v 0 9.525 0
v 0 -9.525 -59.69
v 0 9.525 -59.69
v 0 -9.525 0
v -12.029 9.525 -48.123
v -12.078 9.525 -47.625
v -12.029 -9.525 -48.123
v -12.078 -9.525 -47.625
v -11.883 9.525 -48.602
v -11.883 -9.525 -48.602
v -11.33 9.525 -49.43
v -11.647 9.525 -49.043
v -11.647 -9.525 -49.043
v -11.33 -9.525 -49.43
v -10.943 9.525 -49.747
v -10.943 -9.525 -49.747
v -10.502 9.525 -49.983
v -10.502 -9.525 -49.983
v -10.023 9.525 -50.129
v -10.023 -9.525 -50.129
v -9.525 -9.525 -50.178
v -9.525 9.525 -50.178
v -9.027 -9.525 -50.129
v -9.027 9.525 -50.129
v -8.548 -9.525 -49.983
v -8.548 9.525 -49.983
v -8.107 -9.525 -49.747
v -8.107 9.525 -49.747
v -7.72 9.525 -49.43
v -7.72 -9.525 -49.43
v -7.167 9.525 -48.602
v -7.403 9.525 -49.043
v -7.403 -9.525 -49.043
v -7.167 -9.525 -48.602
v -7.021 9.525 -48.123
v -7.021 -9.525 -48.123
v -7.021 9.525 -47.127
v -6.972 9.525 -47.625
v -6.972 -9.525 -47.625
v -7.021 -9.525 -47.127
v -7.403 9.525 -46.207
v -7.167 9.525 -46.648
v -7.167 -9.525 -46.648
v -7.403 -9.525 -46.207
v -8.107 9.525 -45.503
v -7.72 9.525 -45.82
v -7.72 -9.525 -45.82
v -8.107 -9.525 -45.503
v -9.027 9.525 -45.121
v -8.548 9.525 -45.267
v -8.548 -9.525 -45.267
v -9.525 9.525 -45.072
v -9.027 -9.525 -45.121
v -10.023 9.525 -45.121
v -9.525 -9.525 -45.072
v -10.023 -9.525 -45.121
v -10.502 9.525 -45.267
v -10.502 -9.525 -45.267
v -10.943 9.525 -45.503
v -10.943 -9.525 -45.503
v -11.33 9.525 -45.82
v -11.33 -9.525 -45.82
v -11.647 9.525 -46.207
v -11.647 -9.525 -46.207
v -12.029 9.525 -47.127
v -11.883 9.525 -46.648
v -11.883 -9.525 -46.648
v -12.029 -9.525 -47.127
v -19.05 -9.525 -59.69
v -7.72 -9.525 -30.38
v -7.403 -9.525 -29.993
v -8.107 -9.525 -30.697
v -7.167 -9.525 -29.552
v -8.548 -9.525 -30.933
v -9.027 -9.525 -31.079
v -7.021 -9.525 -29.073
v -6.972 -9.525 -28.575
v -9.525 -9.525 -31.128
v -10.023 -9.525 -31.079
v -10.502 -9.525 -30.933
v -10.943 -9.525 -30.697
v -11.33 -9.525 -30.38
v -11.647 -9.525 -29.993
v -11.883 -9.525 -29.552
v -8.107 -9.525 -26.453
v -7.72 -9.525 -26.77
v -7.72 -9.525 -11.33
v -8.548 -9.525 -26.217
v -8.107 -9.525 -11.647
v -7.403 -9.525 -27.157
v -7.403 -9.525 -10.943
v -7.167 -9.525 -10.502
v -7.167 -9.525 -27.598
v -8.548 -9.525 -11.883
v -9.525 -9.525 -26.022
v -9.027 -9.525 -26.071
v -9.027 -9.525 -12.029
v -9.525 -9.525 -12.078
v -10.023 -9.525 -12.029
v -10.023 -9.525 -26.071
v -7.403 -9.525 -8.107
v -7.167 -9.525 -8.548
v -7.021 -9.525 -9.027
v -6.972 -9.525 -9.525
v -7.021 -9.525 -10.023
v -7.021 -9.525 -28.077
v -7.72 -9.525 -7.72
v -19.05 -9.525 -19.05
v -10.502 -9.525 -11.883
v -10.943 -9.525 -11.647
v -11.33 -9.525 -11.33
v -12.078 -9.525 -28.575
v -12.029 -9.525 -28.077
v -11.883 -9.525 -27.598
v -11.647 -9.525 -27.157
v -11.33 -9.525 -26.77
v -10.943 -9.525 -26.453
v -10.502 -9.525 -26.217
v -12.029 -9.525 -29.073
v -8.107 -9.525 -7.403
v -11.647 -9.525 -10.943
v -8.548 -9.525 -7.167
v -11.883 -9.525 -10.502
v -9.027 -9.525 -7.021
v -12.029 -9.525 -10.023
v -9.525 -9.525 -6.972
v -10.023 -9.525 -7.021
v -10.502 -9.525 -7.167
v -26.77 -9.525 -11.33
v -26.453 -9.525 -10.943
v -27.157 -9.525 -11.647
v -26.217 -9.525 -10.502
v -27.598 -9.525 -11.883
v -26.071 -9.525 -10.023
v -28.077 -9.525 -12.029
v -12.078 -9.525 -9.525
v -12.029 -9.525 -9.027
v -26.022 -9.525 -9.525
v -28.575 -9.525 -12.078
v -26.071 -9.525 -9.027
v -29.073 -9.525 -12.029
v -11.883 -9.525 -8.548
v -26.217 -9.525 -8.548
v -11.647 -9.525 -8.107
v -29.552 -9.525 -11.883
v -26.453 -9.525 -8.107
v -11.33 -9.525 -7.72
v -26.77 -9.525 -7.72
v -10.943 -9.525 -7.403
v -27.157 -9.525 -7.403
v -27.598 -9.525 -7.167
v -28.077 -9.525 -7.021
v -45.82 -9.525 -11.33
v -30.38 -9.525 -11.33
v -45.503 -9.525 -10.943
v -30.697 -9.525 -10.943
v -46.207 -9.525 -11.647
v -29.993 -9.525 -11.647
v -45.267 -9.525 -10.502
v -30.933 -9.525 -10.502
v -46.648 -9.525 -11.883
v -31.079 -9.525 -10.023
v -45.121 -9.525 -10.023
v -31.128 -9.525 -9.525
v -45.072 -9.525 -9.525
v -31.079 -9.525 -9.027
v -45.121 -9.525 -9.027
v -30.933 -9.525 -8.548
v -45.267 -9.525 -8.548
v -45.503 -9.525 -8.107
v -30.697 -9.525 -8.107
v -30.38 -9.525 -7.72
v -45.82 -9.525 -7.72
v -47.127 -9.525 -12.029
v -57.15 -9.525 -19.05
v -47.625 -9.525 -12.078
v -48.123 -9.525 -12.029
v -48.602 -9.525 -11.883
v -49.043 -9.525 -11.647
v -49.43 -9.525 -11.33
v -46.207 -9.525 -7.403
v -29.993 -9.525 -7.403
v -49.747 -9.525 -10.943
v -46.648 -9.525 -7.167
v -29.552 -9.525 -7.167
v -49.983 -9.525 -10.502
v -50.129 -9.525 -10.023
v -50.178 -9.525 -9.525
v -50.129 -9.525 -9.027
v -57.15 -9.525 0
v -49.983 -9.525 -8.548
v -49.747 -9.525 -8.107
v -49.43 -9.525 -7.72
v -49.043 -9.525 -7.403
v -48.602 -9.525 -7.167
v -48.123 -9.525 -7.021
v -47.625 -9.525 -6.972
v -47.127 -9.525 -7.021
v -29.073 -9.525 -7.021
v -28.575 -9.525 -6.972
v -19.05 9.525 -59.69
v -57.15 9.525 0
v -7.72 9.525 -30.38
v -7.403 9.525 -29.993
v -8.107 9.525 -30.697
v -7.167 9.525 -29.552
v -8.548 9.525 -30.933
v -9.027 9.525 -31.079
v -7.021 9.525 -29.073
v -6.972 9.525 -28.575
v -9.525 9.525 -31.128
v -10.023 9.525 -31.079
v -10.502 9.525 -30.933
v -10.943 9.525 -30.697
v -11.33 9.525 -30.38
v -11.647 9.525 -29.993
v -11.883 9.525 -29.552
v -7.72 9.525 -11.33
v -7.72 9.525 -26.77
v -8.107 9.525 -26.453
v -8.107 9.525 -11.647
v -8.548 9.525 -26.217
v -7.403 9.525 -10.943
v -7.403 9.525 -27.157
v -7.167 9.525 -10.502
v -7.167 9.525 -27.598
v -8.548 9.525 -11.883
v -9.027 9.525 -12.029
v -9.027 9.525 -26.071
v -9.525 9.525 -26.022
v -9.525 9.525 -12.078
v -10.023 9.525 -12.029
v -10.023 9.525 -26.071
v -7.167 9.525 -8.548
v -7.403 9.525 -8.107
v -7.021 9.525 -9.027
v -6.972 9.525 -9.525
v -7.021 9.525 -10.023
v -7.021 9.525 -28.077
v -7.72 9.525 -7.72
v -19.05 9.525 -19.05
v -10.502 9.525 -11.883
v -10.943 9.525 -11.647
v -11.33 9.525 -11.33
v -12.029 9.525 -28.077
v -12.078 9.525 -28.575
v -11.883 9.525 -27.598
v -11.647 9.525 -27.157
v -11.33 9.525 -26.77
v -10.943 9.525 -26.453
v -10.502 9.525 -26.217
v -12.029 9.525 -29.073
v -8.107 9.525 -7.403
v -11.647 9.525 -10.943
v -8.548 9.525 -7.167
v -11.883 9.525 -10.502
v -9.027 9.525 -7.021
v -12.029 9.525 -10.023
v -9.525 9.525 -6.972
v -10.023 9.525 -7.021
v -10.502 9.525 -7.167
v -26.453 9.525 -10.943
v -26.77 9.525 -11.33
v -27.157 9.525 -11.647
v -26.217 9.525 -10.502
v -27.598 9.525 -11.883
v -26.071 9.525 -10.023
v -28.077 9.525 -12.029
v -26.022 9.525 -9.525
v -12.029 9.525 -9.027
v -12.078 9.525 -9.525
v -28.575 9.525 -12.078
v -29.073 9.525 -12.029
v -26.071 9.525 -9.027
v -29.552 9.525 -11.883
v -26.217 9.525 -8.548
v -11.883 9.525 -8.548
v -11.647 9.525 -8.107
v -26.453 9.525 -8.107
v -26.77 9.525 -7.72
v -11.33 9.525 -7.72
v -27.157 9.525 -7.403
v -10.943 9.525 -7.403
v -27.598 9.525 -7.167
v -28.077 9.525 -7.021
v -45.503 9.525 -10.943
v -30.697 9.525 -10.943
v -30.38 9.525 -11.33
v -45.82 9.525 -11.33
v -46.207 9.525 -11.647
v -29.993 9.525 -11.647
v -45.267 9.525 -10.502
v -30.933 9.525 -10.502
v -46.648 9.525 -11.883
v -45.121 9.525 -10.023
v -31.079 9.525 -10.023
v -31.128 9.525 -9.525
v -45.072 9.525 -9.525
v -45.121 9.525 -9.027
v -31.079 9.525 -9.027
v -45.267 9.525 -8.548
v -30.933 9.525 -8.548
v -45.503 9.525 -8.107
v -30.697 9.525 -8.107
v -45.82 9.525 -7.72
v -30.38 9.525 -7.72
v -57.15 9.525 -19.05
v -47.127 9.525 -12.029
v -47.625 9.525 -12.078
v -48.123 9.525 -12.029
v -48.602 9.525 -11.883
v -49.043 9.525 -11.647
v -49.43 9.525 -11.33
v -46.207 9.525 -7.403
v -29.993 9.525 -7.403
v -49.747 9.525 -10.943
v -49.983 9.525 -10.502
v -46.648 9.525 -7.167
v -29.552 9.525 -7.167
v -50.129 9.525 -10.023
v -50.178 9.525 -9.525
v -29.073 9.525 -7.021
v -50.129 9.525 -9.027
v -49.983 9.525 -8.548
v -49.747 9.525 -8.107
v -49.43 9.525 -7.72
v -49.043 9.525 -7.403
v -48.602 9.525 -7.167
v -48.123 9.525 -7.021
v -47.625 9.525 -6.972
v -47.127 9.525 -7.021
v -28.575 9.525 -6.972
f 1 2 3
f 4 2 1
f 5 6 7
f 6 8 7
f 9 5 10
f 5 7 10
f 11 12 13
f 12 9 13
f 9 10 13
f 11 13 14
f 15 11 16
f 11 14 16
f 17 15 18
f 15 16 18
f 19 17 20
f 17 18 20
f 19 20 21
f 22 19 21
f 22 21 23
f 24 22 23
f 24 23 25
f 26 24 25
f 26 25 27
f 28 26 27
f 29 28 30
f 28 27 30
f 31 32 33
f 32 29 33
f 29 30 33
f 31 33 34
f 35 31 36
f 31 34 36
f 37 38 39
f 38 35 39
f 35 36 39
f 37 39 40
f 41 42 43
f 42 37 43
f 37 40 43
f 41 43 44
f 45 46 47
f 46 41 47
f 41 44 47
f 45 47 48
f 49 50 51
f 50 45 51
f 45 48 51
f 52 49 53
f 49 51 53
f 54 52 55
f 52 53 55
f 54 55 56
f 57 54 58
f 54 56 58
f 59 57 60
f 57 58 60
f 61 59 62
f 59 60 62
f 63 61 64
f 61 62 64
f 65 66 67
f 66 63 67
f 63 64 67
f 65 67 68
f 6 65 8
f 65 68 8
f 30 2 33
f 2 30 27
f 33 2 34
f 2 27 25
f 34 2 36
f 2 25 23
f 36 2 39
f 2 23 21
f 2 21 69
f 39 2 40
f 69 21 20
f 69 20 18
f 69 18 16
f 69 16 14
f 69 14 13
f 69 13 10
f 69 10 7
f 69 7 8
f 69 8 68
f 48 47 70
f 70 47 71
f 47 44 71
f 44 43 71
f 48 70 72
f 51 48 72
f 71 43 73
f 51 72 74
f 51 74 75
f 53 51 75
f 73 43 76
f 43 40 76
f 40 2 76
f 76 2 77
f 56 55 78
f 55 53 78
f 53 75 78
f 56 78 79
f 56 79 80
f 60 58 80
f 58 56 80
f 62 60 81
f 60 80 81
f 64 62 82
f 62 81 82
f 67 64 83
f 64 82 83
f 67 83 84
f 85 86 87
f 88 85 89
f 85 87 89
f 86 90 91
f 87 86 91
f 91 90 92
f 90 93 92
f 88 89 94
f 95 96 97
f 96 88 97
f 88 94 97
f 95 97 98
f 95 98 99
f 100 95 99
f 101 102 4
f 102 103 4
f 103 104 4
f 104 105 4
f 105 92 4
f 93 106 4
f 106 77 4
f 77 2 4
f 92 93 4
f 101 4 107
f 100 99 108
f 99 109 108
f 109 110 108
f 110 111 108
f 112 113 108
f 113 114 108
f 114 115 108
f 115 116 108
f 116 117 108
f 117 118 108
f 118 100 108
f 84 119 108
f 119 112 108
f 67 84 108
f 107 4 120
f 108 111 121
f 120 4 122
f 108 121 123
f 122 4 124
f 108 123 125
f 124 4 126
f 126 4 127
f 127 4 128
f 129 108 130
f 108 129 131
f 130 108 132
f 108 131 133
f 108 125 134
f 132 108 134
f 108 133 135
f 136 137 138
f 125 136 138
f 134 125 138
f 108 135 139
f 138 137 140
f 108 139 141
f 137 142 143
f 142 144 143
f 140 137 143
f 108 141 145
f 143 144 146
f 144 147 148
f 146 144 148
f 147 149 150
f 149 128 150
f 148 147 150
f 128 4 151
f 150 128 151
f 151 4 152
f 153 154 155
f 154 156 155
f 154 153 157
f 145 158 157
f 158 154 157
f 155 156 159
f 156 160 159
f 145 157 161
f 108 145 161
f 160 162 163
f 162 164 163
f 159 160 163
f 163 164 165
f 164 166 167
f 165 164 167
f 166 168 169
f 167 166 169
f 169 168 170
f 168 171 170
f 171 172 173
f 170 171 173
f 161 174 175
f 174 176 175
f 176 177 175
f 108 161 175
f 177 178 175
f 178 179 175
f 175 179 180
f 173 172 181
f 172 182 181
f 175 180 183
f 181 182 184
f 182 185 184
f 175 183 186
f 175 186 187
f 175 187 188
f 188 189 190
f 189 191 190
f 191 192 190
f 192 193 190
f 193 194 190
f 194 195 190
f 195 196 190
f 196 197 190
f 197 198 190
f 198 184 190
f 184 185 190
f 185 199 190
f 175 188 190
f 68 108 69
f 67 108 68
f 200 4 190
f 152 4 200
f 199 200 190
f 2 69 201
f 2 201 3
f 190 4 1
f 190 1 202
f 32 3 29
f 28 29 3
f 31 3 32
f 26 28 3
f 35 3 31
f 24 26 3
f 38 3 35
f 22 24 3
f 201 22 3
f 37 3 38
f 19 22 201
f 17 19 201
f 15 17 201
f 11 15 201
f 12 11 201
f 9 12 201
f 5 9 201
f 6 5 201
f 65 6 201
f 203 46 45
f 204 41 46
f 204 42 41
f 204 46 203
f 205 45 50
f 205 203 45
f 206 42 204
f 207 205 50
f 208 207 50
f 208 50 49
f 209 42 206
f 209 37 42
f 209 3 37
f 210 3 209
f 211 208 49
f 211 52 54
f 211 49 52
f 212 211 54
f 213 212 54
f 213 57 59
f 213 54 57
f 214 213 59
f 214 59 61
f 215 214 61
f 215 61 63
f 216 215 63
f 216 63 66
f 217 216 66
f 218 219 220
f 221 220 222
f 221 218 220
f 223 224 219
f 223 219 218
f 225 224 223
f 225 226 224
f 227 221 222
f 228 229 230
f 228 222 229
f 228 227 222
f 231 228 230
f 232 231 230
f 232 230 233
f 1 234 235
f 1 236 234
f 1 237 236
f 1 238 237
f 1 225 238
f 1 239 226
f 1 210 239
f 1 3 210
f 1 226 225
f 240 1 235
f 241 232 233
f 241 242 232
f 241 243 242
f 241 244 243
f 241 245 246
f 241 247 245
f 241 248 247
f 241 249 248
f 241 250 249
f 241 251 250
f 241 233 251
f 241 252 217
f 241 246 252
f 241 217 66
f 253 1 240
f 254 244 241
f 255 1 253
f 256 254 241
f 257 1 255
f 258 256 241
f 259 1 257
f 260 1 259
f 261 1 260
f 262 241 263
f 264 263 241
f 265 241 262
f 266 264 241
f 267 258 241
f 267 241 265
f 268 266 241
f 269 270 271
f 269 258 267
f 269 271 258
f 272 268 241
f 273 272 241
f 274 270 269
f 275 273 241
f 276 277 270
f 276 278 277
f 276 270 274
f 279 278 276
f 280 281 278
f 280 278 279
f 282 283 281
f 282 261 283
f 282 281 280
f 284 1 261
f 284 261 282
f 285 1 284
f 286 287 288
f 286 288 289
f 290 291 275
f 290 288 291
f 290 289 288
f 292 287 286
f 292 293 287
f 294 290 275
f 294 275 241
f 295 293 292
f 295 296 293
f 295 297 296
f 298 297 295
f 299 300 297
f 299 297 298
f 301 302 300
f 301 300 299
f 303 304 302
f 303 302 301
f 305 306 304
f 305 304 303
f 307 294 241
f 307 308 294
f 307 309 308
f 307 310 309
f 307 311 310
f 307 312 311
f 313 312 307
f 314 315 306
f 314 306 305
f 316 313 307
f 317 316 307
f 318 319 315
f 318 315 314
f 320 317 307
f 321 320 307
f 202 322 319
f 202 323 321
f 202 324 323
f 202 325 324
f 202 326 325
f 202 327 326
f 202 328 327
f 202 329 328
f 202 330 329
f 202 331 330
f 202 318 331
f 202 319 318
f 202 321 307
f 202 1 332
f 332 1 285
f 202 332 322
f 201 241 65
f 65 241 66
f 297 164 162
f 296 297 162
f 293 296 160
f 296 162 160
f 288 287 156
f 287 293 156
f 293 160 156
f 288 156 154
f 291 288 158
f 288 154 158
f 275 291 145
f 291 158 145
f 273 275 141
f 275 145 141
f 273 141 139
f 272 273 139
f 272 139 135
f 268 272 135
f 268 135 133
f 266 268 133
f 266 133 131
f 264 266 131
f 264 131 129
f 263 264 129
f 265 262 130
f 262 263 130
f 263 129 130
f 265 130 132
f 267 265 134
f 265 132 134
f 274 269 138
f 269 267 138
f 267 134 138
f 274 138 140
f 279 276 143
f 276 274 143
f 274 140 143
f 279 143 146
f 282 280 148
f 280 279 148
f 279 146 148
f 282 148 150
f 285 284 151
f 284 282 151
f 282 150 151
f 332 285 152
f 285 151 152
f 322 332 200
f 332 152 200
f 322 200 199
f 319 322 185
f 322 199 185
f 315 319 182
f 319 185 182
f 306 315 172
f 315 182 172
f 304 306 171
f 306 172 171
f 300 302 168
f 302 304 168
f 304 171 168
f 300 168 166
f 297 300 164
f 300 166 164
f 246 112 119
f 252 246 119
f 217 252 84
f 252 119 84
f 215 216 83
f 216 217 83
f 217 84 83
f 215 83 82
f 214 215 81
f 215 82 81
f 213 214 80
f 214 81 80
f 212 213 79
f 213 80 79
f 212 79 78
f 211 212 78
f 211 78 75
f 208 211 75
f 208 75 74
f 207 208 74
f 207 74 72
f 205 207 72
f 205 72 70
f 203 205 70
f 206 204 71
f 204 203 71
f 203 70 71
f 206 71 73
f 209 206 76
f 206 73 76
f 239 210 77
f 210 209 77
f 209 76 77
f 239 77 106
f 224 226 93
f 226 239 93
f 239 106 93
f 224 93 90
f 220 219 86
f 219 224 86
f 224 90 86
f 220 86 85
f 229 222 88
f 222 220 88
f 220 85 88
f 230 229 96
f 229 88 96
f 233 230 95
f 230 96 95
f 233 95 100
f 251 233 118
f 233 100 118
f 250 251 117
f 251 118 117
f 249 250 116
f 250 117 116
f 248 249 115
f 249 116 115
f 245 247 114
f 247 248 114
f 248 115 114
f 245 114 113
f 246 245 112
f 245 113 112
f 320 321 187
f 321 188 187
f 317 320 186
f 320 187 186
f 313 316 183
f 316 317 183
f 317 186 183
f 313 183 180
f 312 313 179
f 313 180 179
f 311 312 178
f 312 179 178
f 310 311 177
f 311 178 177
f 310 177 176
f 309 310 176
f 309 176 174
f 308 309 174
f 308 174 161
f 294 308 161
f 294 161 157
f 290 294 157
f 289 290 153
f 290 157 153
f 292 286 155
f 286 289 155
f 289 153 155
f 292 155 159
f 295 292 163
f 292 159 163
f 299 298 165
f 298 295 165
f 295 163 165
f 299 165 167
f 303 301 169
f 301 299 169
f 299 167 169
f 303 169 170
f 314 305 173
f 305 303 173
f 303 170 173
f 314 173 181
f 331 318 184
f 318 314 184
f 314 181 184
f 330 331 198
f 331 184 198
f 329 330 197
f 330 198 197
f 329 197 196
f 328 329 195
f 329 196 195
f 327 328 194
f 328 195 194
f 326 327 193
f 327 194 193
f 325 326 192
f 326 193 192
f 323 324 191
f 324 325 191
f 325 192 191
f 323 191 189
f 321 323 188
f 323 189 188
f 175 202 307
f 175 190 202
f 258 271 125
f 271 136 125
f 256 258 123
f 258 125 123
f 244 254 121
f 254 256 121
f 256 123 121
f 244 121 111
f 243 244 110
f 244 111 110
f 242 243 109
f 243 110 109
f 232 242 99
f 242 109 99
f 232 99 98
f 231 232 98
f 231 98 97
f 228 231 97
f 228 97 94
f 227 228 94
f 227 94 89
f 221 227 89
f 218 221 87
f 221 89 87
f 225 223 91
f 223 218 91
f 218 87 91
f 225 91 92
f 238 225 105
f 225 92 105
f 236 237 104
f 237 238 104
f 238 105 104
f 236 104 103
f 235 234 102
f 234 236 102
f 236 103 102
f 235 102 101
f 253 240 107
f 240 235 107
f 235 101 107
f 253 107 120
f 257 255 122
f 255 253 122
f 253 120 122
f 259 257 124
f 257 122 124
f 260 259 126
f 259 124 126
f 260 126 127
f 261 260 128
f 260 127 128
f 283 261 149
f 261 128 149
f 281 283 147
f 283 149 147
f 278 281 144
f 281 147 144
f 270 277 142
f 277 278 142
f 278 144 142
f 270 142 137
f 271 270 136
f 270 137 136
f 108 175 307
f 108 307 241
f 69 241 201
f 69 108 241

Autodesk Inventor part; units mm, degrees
ref_plane "YZ Plane" through (0, 0, 0) normal (1, 0, 0) x (0, 1, 0)
ref_plane "XZ Plane" through (0, 0, 0) normal (0, 1, 0) x (-1, 0, 0)
ref_plane "XY Plane" through (0, 0, 0) normal (0, 0, 1) x (1, 0, 0)
sketch "Sketch1" plane through (0, 0, 0) normal (0, 1, 0) x (-1, 0, 0)
  line L0 (0, 0) -> (57.15, 0)
  line L1 (57.15, 0) -> (57.15, -19.05)
  line L2 (57.15, -19.05) -> (19.05, -19.05)
  line L3 (19.05, -19.05) -> (19.05, -59.69)
  line L4 (19.05, -59.69) -> (0, -59.69)
  line L5 (0, -59.69) -> (0, 0)
  circle A0 centre (28.575, -9.525) radius 2.5527
  circle A1 centre (47.625, -9.525) radius 2.5527
  line L6 (19.05, -19.05) -> (0, 0) construction
  circle A2 centre (9.525, -28.575) radius 2.5527
  circle A3 centre (9.525, -47.625) radius 2.5527
  circle A4 centre (9.525, -9.525) radius 2.5527
  point P0 (57.15, -9.525)
  dimension "d0" = 19.05
  dimension "d1" = 19.05
  dimension "d2" = 59.69
  dimension "d3" = 57.15
  dimension "d4" = 5.1054
  dimension "d5" = 28.575
  dimension "d6" = 19.05
extrude "Extrusion1" add sketch "Sketch1" along normal mid plane 19.05
thread "Thread1" size "1/4-20 UNC" class "2B" standard "ANSI Unified Screw Threads" full length
thread "Thread2" size "1/4-20 UNC" class "2B" standard "ANSI Unified Screw Threads" full length
thread "Thread3" size "1/4-20 UNC" class "2B" standard "ANSI Unified Screw Threads" full length
thread "Thread4" size "1/4-20 UNC" class "2B" standard "ANSI Unified Screw Threads" full length
thread "Thread5" size "1/4-20 UNC" class "2B" standard "ANSI Unified Screw Threads" full length
properties part number "STRU_025_DoubleBillet_90_2.25in_2" material "Aluminum 6061"
